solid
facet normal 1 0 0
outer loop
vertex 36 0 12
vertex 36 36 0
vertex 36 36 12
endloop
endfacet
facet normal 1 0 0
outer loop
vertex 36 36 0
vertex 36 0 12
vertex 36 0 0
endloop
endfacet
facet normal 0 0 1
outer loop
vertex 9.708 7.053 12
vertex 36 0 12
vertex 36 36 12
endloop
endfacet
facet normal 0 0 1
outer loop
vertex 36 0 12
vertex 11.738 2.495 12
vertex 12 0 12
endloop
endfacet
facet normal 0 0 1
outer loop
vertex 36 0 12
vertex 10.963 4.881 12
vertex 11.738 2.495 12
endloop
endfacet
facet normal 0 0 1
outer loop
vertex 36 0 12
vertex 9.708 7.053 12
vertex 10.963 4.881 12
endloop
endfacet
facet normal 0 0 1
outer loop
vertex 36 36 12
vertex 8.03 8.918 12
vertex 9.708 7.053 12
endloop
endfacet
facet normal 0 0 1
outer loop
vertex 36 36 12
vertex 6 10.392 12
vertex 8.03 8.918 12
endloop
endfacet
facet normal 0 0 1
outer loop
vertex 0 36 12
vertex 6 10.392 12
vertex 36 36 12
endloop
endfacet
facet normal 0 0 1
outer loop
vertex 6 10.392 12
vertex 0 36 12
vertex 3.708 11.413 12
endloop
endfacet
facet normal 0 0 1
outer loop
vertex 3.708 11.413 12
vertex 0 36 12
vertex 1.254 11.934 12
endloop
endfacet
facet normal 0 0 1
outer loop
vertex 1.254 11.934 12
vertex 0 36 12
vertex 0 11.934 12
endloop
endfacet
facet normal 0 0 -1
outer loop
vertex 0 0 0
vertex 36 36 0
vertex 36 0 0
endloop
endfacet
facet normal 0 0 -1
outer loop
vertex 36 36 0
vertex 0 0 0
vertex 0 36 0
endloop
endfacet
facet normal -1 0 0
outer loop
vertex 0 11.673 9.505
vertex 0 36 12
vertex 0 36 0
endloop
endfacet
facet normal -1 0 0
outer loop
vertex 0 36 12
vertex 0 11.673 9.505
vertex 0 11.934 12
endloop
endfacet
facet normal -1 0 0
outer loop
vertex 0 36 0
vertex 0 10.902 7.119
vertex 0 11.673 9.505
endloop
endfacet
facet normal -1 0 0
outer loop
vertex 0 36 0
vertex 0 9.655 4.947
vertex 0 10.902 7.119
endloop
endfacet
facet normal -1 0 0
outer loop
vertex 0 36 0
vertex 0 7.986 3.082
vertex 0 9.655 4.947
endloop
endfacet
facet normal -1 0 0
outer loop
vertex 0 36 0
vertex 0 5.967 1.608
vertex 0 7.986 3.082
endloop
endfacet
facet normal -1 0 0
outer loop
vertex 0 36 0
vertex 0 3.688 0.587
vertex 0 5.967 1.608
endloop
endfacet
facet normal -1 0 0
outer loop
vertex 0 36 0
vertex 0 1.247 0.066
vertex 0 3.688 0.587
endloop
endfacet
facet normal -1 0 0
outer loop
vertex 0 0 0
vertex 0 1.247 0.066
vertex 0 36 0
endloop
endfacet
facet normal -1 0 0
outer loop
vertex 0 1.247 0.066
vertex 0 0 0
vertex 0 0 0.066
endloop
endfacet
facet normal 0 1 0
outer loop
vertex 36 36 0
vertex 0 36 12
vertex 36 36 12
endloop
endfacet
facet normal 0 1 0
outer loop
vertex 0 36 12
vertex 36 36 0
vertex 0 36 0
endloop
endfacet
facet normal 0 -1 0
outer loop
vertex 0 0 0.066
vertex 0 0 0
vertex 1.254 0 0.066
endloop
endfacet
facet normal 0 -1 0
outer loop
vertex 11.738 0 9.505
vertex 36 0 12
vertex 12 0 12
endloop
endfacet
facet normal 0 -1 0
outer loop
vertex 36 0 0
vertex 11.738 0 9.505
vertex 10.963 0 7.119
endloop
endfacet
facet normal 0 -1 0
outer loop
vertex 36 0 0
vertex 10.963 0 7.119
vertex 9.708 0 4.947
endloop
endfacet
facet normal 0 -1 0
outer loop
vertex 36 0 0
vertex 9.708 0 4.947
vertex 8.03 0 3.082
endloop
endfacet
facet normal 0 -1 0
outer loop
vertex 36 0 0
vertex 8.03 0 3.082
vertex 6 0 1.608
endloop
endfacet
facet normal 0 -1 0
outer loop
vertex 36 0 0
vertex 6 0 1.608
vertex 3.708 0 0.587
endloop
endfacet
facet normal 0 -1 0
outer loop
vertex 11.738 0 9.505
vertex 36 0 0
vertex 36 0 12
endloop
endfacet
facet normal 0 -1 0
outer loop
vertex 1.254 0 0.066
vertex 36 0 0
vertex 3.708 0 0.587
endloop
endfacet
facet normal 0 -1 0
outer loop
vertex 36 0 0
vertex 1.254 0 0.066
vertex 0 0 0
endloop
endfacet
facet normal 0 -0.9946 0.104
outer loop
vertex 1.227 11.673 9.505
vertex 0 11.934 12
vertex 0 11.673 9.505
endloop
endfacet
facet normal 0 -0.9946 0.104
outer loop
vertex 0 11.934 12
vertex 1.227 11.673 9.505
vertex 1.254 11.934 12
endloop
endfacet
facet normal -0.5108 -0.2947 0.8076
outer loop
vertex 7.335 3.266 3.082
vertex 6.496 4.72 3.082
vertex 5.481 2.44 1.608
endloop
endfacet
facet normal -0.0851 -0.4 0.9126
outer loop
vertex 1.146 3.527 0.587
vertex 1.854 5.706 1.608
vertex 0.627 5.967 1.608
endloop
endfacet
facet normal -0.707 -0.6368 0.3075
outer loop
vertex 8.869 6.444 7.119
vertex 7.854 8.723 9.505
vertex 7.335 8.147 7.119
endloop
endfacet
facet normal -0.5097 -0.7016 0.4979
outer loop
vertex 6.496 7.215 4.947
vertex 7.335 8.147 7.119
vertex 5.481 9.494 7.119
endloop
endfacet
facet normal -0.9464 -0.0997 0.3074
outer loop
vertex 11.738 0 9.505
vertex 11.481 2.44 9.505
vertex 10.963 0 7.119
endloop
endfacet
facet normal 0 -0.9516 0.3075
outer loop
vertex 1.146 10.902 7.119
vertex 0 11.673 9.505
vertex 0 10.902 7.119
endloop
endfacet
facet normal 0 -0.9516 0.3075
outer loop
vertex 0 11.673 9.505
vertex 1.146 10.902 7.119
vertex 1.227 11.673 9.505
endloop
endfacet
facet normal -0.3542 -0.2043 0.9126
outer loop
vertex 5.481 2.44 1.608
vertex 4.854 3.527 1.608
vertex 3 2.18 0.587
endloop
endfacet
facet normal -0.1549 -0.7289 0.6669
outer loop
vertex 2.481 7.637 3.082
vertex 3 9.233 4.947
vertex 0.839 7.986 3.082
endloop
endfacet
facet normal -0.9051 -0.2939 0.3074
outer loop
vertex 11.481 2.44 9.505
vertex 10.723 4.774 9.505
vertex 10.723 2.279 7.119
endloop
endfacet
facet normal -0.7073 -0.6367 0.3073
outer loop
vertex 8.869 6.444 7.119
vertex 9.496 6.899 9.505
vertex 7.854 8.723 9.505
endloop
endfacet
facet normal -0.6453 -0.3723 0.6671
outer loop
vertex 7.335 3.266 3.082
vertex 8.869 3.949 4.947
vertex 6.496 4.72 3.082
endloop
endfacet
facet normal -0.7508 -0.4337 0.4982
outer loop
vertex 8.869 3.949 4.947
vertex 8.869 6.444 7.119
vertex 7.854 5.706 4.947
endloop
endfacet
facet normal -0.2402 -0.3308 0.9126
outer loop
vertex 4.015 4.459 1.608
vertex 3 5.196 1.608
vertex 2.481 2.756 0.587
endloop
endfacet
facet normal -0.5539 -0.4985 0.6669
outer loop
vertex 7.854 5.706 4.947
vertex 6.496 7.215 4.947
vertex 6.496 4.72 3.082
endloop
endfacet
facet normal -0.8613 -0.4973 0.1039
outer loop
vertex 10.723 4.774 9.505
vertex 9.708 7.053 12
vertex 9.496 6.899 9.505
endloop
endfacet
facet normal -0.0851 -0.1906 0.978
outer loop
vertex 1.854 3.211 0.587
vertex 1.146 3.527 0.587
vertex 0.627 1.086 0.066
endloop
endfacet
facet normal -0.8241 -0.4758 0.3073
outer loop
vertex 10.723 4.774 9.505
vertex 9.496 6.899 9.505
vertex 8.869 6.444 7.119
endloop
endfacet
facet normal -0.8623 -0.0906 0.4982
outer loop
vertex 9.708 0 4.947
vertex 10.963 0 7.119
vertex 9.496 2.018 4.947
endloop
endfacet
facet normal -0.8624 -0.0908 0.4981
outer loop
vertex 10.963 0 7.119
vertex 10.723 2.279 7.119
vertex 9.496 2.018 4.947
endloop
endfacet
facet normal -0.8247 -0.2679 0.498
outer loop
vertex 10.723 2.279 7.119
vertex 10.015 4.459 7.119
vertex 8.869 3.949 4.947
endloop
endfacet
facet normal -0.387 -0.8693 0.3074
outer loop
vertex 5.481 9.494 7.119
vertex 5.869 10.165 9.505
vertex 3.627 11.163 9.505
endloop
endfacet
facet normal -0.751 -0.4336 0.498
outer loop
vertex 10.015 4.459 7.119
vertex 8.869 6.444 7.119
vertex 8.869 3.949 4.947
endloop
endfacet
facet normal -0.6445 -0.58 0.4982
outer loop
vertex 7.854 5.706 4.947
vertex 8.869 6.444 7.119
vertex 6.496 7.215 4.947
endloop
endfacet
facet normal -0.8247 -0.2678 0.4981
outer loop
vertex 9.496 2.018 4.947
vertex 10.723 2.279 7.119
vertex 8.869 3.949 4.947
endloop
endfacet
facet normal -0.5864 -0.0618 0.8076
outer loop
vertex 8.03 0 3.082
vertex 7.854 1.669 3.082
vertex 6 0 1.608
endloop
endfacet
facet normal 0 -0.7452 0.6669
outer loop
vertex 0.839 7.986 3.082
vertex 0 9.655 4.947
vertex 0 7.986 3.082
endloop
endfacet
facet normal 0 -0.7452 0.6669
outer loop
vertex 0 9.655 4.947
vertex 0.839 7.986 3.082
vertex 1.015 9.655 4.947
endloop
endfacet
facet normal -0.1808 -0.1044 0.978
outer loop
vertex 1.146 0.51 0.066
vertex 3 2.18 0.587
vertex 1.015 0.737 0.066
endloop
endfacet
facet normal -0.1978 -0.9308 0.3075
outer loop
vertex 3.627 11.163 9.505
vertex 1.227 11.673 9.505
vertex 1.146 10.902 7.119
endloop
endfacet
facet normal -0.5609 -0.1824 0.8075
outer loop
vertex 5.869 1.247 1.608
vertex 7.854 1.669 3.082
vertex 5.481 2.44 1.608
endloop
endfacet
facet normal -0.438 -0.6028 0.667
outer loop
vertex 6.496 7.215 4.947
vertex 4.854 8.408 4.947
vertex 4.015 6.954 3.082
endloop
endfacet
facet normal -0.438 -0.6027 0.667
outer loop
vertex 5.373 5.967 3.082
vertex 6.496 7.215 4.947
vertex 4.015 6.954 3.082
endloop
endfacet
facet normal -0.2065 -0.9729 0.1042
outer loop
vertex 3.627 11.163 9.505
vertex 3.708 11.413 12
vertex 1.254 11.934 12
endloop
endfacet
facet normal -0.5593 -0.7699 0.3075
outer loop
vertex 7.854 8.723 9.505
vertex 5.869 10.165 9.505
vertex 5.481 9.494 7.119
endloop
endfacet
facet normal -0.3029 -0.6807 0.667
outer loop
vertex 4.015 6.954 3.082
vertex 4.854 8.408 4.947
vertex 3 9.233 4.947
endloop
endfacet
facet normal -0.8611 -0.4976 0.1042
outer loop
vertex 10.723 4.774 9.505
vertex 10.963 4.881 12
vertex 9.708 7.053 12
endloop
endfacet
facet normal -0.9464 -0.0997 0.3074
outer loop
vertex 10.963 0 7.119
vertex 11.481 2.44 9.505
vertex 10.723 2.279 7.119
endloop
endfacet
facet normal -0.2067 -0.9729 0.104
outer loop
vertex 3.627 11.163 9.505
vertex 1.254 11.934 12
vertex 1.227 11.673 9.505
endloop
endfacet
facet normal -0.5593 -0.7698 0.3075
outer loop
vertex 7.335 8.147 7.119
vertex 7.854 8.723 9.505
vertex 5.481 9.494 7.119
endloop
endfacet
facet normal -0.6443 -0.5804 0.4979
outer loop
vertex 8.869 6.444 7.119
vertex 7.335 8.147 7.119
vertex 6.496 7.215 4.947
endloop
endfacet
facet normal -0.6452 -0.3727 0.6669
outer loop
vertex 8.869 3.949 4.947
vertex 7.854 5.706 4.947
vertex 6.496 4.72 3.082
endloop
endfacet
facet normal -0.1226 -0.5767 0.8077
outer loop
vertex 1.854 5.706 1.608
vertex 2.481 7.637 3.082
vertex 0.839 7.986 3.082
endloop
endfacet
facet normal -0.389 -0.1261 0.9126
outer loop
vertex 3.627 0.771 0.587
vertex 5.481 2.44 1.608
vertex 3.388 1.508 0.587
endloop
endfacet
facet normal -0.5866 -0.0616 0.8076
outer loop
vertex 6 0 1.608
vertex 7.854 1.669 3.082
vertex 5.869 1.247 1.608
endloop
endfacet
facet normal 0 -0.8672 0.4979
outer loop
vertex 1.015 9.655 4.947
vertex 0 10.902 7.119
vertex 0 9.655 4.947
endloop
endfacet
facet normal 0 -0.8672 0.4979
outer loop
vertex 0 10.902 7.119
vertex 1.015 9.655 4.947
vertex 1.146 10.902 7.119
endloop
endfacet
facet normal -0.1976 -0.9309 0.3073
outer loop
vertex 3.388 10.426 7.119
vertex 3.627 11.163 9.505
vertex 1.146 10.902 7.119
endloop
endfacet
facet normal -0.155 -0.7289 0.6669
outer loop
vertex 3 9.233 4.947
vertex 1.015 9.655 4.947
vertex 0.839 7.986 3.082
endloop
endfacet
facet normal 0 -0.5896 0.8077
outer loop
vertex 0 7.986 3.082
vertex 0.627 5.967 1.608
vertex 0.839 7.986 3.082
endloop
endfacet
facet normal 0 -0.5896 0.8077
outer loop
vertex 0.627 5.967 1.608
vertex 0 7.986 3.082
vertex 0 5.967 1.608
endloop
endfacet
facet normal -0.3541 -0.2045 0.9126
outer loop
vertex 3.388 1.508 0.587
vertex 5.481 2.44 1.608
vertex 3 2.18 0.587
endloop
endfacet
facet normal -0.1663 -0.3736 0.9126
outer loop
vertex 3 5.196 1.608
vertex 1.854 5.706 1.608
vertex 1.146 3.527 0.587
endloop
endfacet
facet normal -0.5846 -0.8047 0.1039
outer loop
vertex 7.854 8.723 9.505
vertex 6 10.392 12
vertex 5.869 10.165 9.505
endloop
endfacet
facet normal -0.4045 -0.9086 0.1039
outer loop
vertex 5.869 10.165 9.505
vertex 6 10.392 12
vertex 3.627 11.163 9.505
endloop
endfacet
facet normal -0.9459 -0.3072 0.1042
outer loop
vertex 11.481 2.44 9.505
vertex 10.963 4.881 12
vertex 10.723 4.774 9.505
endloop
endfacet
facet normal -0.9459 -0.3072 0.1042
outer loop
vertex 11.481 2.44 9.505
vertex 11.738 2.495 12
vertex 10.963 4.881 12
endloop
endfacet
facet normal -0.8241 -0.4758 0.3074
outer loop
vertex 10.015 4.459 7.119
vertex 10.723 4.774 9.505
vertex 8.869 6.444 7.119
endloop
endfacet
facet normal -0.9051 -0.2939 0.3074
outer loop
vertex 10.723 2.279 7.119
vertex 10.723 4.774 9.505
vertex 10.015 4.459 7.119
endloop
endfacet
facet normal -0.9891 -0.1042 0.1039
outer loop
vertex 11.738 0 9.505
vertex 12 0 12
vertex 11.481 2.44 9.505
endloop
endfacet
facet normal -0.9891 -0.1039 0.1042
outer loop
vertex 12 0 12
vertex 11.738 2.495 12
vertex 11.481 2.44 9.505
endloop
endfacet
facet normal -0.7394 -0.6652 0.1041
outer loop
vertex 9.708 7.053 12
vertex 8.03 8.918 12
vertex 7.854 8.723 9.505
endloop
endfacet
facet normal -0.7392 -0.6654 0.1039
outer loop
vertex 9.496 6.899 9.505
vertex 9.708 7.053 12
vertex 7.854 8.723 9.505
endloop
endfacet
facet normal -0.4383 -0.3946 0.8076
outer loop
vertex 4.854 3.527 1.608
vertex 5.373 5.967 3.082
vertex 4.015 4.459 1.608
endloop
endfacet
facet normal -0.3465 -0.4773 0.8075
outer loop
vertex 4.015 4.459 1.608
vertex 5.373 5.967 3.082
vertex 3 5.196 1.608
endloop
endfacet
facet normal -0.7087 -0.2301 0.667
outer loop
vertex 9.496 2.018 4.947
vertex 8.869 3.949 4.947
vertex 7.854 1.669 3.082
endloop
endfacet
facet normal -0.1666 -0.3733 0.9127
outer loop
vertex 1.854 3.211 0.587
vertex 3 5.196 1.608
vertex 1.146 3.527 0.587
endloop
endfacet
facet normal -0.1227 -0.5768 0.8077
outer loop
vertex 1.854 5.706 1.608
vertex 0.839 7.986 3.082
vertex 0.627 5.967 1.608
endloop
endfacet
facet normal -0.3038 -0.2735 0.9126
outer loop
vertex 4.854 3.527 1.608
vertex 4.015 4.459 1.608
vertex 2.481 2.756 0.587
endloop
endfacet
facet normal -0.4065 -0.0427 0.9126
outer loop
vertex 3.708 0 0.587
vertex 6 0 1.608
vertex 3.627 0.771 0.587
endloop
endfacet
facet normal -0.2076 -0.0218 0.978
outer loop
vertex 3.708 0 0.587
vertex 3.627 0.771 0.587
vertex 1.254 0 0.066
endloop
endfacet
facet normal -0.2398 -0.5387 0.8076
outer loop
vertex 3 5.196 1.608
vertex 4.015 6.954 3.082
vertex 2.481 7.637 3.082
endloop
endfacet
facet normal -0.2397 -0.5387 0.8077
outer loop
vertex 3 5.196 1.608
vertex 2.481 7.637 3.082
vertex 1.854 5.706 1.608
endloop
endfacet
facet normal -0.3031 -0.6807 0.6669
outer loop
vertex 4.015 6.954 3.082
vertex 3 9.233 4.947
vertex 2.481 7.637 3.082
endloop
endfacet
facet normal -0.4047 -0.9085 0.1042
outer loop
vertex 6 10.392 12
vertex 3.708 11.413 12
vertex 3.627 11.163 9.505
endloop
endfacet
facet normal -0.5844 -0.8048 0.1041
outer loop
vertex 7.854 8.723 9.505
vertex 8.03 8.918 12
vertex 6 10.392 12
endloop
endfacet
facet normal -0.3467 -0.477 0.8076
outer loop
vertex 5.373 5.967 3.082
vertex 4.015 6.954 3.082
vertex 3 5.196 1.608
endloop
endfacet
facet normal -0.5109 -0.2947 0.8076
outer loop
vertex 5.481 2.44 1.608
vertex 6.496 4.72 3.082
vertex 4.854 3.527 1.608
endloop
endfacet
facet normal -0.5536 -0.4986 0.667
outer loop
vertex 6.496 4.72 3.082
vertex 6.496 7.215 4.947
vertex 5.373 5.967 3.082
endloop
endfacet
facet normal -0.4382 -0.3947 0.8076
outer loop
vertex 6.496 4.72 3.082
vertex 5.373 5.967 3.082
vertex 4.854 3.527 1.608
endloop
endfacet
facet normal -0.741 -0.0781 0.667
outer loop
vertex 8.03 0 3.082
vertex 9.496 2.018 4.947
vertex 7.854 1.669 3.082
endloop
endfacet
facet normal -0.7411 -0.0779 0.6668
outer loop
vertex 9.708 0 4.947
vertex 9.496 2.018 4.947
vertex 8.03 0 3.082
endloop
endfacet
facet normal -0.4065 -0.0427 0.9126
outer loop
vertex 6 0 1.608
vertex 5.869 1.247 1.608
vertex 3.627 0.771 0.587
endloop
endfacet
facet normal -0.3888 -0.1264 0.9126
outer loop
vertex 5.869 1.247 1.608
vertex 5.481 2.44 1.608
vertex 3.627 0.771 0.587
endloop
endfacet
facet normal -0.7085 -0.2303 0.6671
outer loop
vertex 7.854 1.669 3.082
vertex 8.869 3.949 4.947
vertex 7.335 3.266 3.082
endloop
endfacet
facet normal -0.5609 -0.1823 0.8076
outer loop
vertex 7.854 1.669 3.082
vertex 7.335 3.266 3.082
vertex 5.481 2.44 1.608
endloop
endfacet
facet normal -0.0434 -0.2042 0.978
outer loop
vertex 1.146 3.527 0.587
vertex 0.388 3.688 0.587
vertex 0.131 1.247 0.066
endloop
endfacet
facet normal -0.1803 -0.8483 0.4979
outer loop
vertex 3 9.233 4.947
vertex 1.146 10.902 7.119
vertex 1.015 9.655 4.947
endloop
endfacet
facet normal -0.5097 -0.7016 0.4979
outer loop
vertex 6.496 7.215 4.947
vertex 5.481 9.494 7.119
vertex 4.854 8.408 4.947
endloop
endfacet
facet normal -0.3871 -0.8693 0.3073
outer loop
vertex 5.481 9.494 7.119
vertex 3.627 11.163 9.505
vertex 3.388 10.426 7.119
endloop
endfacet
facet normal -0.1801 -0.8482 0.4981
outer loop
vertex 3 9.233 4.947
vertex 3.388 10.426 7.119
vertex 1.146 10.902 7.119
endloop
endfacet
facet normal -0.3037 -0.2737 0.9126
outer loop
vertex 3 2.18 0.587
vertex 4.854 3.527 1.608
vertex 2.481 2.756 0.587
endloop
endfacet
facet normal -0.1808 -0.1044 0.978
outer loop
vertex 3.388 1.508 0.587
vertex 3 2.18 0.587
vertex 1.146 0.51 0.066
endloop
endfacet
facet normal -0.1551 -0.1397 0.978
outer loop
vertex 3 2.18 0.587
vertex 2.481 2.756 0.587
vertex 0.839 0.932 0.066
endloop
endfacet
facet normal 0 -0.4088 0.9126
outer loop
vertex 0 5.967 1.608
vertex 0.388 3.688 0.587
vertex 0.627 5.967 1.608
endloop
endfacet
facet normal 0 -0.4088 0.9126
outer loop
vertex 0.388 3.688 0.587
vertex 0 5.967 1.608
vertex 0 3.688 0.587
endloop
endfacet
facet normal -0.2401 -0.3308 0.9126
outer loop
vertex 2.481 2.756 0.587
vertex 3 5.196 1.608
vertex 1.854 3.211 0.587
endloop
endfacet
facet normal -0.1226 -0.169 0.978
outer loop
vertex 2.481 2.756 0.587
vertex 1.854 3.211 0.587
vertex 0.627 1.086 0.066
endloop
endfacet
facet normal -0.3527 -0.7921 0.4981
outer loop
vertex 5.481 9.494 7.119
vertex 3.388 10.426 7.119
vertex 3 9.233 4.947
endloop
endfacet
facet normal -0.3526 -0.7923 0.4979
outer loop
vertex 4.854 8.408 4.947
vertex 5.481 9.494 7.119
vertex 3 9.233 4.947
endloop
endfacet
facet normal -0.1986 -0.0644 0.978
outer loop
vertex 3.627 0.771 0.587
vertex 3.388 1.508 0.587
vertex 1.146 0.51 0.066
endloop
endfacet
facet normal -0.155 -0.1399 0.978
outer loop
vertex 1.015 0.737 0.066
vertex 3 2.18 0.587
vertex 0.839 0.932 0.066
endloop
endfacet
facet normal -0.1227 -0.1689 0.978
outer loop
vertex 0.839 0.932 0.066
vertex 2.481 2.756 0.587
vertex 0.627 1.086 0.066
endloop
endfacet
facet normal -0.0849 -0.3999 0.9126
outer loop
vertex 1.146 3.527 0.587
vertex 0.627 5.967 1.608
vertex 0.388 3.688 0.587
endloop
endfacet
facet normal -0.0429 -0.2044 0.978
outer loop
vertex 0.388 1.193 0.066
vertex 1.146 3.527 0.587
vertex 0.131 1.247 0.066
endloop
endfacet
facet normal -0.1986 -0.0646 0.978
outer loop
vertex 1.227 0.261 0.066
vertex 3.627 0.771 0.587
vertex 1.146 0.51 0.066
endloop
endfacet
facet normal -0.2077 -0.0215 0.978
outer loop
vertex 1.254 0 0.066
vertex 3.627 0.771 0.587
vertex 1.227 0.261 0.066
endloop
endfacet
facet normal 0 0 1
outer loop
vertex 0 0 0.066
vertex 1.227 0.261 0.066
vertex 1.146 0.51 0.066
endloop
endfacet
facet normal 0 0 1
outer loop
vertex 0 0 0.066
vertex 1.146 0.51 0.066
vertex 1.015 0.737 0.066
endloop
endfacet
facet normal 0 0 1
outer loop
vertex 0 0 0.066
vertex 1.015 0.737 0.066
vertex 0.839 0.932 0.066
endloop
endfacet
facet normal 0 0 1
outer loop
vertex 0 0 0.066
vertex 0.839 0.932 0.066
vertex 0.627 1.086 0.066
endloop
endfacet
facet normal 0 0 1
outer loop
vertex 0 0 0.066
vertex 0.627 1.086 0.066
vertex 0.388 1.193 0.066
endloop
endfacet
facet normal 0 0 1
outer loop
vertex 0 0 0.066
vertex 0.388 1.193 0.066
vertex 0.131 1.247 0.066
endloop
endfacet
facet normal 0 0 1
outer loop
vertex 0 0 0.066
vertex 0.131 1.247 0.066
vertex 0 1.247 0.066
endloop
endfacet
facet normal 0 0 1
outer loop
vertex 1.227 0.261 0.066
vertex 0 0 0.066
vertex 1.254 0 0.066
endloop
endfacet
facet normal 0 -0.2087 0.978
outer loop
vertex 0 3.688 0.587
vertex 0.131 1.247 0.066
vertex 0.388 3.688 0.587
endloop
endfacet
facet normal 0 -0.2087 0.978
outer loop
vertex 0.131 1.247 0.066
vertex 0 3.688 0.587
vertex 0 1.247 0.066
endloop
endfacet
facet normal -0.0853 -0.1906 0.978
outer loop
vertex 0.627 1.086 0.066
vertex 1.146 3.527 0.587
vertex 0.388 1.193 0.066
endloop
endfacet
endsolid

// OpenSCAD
COLOR="";

module if_color(_color) {
    if(COLOR == _color || COLOR == "")
    color(_color)
    children();
}

module plywood(veneer=0.5, layers=3, height=12, glue=0.2, max_x=1000, max_y=1000) {

	module layer(start, end) {
		intersection() {
			translate([-max_x/2, -max_y/2, start])
			cube([max_x, max_y, end-start]);
			children();
		}
	}

	range=height-veneer*2;

	glue_gap=range/(layers);
	layer_gap=range/(layers);

	// glue
	if_color("#72481f")
	for(z=[0:glue_gap:range])
	layer(z+veneer-glue/2,z+veneer+glue/2)
	children();

	// outer inner layers
	if_color("#b78d64")
	for(n=[0:2:layers-1])
	layer(n*layer_gap+veneer+glue/2,n*layer_gap+veneer+layer_gap-glue/2)
	children();

	// middle inner layers
	if_color("#9e734a")
	for(n=[1:2:layers-1])
	layer(n*layer_gap+veneer+glue/2,n*layer_gap+veneer+layer_gap-glue/2)
	children();
	
	// veneer
	if_color("#dca97a") {
		layer(0,veneer-glue/2)
		children();

		layer(height-veneer+glue/2,height)
		children();
	}
	
}

// RENDER obj
module test() {
	test_height=12;
	plywood()
	difference() {
		cube([test_height*3,test_height*3,test_height]);
		translate([0,0,test_height])
		sphere(r=test_height);

	}
}

test();
